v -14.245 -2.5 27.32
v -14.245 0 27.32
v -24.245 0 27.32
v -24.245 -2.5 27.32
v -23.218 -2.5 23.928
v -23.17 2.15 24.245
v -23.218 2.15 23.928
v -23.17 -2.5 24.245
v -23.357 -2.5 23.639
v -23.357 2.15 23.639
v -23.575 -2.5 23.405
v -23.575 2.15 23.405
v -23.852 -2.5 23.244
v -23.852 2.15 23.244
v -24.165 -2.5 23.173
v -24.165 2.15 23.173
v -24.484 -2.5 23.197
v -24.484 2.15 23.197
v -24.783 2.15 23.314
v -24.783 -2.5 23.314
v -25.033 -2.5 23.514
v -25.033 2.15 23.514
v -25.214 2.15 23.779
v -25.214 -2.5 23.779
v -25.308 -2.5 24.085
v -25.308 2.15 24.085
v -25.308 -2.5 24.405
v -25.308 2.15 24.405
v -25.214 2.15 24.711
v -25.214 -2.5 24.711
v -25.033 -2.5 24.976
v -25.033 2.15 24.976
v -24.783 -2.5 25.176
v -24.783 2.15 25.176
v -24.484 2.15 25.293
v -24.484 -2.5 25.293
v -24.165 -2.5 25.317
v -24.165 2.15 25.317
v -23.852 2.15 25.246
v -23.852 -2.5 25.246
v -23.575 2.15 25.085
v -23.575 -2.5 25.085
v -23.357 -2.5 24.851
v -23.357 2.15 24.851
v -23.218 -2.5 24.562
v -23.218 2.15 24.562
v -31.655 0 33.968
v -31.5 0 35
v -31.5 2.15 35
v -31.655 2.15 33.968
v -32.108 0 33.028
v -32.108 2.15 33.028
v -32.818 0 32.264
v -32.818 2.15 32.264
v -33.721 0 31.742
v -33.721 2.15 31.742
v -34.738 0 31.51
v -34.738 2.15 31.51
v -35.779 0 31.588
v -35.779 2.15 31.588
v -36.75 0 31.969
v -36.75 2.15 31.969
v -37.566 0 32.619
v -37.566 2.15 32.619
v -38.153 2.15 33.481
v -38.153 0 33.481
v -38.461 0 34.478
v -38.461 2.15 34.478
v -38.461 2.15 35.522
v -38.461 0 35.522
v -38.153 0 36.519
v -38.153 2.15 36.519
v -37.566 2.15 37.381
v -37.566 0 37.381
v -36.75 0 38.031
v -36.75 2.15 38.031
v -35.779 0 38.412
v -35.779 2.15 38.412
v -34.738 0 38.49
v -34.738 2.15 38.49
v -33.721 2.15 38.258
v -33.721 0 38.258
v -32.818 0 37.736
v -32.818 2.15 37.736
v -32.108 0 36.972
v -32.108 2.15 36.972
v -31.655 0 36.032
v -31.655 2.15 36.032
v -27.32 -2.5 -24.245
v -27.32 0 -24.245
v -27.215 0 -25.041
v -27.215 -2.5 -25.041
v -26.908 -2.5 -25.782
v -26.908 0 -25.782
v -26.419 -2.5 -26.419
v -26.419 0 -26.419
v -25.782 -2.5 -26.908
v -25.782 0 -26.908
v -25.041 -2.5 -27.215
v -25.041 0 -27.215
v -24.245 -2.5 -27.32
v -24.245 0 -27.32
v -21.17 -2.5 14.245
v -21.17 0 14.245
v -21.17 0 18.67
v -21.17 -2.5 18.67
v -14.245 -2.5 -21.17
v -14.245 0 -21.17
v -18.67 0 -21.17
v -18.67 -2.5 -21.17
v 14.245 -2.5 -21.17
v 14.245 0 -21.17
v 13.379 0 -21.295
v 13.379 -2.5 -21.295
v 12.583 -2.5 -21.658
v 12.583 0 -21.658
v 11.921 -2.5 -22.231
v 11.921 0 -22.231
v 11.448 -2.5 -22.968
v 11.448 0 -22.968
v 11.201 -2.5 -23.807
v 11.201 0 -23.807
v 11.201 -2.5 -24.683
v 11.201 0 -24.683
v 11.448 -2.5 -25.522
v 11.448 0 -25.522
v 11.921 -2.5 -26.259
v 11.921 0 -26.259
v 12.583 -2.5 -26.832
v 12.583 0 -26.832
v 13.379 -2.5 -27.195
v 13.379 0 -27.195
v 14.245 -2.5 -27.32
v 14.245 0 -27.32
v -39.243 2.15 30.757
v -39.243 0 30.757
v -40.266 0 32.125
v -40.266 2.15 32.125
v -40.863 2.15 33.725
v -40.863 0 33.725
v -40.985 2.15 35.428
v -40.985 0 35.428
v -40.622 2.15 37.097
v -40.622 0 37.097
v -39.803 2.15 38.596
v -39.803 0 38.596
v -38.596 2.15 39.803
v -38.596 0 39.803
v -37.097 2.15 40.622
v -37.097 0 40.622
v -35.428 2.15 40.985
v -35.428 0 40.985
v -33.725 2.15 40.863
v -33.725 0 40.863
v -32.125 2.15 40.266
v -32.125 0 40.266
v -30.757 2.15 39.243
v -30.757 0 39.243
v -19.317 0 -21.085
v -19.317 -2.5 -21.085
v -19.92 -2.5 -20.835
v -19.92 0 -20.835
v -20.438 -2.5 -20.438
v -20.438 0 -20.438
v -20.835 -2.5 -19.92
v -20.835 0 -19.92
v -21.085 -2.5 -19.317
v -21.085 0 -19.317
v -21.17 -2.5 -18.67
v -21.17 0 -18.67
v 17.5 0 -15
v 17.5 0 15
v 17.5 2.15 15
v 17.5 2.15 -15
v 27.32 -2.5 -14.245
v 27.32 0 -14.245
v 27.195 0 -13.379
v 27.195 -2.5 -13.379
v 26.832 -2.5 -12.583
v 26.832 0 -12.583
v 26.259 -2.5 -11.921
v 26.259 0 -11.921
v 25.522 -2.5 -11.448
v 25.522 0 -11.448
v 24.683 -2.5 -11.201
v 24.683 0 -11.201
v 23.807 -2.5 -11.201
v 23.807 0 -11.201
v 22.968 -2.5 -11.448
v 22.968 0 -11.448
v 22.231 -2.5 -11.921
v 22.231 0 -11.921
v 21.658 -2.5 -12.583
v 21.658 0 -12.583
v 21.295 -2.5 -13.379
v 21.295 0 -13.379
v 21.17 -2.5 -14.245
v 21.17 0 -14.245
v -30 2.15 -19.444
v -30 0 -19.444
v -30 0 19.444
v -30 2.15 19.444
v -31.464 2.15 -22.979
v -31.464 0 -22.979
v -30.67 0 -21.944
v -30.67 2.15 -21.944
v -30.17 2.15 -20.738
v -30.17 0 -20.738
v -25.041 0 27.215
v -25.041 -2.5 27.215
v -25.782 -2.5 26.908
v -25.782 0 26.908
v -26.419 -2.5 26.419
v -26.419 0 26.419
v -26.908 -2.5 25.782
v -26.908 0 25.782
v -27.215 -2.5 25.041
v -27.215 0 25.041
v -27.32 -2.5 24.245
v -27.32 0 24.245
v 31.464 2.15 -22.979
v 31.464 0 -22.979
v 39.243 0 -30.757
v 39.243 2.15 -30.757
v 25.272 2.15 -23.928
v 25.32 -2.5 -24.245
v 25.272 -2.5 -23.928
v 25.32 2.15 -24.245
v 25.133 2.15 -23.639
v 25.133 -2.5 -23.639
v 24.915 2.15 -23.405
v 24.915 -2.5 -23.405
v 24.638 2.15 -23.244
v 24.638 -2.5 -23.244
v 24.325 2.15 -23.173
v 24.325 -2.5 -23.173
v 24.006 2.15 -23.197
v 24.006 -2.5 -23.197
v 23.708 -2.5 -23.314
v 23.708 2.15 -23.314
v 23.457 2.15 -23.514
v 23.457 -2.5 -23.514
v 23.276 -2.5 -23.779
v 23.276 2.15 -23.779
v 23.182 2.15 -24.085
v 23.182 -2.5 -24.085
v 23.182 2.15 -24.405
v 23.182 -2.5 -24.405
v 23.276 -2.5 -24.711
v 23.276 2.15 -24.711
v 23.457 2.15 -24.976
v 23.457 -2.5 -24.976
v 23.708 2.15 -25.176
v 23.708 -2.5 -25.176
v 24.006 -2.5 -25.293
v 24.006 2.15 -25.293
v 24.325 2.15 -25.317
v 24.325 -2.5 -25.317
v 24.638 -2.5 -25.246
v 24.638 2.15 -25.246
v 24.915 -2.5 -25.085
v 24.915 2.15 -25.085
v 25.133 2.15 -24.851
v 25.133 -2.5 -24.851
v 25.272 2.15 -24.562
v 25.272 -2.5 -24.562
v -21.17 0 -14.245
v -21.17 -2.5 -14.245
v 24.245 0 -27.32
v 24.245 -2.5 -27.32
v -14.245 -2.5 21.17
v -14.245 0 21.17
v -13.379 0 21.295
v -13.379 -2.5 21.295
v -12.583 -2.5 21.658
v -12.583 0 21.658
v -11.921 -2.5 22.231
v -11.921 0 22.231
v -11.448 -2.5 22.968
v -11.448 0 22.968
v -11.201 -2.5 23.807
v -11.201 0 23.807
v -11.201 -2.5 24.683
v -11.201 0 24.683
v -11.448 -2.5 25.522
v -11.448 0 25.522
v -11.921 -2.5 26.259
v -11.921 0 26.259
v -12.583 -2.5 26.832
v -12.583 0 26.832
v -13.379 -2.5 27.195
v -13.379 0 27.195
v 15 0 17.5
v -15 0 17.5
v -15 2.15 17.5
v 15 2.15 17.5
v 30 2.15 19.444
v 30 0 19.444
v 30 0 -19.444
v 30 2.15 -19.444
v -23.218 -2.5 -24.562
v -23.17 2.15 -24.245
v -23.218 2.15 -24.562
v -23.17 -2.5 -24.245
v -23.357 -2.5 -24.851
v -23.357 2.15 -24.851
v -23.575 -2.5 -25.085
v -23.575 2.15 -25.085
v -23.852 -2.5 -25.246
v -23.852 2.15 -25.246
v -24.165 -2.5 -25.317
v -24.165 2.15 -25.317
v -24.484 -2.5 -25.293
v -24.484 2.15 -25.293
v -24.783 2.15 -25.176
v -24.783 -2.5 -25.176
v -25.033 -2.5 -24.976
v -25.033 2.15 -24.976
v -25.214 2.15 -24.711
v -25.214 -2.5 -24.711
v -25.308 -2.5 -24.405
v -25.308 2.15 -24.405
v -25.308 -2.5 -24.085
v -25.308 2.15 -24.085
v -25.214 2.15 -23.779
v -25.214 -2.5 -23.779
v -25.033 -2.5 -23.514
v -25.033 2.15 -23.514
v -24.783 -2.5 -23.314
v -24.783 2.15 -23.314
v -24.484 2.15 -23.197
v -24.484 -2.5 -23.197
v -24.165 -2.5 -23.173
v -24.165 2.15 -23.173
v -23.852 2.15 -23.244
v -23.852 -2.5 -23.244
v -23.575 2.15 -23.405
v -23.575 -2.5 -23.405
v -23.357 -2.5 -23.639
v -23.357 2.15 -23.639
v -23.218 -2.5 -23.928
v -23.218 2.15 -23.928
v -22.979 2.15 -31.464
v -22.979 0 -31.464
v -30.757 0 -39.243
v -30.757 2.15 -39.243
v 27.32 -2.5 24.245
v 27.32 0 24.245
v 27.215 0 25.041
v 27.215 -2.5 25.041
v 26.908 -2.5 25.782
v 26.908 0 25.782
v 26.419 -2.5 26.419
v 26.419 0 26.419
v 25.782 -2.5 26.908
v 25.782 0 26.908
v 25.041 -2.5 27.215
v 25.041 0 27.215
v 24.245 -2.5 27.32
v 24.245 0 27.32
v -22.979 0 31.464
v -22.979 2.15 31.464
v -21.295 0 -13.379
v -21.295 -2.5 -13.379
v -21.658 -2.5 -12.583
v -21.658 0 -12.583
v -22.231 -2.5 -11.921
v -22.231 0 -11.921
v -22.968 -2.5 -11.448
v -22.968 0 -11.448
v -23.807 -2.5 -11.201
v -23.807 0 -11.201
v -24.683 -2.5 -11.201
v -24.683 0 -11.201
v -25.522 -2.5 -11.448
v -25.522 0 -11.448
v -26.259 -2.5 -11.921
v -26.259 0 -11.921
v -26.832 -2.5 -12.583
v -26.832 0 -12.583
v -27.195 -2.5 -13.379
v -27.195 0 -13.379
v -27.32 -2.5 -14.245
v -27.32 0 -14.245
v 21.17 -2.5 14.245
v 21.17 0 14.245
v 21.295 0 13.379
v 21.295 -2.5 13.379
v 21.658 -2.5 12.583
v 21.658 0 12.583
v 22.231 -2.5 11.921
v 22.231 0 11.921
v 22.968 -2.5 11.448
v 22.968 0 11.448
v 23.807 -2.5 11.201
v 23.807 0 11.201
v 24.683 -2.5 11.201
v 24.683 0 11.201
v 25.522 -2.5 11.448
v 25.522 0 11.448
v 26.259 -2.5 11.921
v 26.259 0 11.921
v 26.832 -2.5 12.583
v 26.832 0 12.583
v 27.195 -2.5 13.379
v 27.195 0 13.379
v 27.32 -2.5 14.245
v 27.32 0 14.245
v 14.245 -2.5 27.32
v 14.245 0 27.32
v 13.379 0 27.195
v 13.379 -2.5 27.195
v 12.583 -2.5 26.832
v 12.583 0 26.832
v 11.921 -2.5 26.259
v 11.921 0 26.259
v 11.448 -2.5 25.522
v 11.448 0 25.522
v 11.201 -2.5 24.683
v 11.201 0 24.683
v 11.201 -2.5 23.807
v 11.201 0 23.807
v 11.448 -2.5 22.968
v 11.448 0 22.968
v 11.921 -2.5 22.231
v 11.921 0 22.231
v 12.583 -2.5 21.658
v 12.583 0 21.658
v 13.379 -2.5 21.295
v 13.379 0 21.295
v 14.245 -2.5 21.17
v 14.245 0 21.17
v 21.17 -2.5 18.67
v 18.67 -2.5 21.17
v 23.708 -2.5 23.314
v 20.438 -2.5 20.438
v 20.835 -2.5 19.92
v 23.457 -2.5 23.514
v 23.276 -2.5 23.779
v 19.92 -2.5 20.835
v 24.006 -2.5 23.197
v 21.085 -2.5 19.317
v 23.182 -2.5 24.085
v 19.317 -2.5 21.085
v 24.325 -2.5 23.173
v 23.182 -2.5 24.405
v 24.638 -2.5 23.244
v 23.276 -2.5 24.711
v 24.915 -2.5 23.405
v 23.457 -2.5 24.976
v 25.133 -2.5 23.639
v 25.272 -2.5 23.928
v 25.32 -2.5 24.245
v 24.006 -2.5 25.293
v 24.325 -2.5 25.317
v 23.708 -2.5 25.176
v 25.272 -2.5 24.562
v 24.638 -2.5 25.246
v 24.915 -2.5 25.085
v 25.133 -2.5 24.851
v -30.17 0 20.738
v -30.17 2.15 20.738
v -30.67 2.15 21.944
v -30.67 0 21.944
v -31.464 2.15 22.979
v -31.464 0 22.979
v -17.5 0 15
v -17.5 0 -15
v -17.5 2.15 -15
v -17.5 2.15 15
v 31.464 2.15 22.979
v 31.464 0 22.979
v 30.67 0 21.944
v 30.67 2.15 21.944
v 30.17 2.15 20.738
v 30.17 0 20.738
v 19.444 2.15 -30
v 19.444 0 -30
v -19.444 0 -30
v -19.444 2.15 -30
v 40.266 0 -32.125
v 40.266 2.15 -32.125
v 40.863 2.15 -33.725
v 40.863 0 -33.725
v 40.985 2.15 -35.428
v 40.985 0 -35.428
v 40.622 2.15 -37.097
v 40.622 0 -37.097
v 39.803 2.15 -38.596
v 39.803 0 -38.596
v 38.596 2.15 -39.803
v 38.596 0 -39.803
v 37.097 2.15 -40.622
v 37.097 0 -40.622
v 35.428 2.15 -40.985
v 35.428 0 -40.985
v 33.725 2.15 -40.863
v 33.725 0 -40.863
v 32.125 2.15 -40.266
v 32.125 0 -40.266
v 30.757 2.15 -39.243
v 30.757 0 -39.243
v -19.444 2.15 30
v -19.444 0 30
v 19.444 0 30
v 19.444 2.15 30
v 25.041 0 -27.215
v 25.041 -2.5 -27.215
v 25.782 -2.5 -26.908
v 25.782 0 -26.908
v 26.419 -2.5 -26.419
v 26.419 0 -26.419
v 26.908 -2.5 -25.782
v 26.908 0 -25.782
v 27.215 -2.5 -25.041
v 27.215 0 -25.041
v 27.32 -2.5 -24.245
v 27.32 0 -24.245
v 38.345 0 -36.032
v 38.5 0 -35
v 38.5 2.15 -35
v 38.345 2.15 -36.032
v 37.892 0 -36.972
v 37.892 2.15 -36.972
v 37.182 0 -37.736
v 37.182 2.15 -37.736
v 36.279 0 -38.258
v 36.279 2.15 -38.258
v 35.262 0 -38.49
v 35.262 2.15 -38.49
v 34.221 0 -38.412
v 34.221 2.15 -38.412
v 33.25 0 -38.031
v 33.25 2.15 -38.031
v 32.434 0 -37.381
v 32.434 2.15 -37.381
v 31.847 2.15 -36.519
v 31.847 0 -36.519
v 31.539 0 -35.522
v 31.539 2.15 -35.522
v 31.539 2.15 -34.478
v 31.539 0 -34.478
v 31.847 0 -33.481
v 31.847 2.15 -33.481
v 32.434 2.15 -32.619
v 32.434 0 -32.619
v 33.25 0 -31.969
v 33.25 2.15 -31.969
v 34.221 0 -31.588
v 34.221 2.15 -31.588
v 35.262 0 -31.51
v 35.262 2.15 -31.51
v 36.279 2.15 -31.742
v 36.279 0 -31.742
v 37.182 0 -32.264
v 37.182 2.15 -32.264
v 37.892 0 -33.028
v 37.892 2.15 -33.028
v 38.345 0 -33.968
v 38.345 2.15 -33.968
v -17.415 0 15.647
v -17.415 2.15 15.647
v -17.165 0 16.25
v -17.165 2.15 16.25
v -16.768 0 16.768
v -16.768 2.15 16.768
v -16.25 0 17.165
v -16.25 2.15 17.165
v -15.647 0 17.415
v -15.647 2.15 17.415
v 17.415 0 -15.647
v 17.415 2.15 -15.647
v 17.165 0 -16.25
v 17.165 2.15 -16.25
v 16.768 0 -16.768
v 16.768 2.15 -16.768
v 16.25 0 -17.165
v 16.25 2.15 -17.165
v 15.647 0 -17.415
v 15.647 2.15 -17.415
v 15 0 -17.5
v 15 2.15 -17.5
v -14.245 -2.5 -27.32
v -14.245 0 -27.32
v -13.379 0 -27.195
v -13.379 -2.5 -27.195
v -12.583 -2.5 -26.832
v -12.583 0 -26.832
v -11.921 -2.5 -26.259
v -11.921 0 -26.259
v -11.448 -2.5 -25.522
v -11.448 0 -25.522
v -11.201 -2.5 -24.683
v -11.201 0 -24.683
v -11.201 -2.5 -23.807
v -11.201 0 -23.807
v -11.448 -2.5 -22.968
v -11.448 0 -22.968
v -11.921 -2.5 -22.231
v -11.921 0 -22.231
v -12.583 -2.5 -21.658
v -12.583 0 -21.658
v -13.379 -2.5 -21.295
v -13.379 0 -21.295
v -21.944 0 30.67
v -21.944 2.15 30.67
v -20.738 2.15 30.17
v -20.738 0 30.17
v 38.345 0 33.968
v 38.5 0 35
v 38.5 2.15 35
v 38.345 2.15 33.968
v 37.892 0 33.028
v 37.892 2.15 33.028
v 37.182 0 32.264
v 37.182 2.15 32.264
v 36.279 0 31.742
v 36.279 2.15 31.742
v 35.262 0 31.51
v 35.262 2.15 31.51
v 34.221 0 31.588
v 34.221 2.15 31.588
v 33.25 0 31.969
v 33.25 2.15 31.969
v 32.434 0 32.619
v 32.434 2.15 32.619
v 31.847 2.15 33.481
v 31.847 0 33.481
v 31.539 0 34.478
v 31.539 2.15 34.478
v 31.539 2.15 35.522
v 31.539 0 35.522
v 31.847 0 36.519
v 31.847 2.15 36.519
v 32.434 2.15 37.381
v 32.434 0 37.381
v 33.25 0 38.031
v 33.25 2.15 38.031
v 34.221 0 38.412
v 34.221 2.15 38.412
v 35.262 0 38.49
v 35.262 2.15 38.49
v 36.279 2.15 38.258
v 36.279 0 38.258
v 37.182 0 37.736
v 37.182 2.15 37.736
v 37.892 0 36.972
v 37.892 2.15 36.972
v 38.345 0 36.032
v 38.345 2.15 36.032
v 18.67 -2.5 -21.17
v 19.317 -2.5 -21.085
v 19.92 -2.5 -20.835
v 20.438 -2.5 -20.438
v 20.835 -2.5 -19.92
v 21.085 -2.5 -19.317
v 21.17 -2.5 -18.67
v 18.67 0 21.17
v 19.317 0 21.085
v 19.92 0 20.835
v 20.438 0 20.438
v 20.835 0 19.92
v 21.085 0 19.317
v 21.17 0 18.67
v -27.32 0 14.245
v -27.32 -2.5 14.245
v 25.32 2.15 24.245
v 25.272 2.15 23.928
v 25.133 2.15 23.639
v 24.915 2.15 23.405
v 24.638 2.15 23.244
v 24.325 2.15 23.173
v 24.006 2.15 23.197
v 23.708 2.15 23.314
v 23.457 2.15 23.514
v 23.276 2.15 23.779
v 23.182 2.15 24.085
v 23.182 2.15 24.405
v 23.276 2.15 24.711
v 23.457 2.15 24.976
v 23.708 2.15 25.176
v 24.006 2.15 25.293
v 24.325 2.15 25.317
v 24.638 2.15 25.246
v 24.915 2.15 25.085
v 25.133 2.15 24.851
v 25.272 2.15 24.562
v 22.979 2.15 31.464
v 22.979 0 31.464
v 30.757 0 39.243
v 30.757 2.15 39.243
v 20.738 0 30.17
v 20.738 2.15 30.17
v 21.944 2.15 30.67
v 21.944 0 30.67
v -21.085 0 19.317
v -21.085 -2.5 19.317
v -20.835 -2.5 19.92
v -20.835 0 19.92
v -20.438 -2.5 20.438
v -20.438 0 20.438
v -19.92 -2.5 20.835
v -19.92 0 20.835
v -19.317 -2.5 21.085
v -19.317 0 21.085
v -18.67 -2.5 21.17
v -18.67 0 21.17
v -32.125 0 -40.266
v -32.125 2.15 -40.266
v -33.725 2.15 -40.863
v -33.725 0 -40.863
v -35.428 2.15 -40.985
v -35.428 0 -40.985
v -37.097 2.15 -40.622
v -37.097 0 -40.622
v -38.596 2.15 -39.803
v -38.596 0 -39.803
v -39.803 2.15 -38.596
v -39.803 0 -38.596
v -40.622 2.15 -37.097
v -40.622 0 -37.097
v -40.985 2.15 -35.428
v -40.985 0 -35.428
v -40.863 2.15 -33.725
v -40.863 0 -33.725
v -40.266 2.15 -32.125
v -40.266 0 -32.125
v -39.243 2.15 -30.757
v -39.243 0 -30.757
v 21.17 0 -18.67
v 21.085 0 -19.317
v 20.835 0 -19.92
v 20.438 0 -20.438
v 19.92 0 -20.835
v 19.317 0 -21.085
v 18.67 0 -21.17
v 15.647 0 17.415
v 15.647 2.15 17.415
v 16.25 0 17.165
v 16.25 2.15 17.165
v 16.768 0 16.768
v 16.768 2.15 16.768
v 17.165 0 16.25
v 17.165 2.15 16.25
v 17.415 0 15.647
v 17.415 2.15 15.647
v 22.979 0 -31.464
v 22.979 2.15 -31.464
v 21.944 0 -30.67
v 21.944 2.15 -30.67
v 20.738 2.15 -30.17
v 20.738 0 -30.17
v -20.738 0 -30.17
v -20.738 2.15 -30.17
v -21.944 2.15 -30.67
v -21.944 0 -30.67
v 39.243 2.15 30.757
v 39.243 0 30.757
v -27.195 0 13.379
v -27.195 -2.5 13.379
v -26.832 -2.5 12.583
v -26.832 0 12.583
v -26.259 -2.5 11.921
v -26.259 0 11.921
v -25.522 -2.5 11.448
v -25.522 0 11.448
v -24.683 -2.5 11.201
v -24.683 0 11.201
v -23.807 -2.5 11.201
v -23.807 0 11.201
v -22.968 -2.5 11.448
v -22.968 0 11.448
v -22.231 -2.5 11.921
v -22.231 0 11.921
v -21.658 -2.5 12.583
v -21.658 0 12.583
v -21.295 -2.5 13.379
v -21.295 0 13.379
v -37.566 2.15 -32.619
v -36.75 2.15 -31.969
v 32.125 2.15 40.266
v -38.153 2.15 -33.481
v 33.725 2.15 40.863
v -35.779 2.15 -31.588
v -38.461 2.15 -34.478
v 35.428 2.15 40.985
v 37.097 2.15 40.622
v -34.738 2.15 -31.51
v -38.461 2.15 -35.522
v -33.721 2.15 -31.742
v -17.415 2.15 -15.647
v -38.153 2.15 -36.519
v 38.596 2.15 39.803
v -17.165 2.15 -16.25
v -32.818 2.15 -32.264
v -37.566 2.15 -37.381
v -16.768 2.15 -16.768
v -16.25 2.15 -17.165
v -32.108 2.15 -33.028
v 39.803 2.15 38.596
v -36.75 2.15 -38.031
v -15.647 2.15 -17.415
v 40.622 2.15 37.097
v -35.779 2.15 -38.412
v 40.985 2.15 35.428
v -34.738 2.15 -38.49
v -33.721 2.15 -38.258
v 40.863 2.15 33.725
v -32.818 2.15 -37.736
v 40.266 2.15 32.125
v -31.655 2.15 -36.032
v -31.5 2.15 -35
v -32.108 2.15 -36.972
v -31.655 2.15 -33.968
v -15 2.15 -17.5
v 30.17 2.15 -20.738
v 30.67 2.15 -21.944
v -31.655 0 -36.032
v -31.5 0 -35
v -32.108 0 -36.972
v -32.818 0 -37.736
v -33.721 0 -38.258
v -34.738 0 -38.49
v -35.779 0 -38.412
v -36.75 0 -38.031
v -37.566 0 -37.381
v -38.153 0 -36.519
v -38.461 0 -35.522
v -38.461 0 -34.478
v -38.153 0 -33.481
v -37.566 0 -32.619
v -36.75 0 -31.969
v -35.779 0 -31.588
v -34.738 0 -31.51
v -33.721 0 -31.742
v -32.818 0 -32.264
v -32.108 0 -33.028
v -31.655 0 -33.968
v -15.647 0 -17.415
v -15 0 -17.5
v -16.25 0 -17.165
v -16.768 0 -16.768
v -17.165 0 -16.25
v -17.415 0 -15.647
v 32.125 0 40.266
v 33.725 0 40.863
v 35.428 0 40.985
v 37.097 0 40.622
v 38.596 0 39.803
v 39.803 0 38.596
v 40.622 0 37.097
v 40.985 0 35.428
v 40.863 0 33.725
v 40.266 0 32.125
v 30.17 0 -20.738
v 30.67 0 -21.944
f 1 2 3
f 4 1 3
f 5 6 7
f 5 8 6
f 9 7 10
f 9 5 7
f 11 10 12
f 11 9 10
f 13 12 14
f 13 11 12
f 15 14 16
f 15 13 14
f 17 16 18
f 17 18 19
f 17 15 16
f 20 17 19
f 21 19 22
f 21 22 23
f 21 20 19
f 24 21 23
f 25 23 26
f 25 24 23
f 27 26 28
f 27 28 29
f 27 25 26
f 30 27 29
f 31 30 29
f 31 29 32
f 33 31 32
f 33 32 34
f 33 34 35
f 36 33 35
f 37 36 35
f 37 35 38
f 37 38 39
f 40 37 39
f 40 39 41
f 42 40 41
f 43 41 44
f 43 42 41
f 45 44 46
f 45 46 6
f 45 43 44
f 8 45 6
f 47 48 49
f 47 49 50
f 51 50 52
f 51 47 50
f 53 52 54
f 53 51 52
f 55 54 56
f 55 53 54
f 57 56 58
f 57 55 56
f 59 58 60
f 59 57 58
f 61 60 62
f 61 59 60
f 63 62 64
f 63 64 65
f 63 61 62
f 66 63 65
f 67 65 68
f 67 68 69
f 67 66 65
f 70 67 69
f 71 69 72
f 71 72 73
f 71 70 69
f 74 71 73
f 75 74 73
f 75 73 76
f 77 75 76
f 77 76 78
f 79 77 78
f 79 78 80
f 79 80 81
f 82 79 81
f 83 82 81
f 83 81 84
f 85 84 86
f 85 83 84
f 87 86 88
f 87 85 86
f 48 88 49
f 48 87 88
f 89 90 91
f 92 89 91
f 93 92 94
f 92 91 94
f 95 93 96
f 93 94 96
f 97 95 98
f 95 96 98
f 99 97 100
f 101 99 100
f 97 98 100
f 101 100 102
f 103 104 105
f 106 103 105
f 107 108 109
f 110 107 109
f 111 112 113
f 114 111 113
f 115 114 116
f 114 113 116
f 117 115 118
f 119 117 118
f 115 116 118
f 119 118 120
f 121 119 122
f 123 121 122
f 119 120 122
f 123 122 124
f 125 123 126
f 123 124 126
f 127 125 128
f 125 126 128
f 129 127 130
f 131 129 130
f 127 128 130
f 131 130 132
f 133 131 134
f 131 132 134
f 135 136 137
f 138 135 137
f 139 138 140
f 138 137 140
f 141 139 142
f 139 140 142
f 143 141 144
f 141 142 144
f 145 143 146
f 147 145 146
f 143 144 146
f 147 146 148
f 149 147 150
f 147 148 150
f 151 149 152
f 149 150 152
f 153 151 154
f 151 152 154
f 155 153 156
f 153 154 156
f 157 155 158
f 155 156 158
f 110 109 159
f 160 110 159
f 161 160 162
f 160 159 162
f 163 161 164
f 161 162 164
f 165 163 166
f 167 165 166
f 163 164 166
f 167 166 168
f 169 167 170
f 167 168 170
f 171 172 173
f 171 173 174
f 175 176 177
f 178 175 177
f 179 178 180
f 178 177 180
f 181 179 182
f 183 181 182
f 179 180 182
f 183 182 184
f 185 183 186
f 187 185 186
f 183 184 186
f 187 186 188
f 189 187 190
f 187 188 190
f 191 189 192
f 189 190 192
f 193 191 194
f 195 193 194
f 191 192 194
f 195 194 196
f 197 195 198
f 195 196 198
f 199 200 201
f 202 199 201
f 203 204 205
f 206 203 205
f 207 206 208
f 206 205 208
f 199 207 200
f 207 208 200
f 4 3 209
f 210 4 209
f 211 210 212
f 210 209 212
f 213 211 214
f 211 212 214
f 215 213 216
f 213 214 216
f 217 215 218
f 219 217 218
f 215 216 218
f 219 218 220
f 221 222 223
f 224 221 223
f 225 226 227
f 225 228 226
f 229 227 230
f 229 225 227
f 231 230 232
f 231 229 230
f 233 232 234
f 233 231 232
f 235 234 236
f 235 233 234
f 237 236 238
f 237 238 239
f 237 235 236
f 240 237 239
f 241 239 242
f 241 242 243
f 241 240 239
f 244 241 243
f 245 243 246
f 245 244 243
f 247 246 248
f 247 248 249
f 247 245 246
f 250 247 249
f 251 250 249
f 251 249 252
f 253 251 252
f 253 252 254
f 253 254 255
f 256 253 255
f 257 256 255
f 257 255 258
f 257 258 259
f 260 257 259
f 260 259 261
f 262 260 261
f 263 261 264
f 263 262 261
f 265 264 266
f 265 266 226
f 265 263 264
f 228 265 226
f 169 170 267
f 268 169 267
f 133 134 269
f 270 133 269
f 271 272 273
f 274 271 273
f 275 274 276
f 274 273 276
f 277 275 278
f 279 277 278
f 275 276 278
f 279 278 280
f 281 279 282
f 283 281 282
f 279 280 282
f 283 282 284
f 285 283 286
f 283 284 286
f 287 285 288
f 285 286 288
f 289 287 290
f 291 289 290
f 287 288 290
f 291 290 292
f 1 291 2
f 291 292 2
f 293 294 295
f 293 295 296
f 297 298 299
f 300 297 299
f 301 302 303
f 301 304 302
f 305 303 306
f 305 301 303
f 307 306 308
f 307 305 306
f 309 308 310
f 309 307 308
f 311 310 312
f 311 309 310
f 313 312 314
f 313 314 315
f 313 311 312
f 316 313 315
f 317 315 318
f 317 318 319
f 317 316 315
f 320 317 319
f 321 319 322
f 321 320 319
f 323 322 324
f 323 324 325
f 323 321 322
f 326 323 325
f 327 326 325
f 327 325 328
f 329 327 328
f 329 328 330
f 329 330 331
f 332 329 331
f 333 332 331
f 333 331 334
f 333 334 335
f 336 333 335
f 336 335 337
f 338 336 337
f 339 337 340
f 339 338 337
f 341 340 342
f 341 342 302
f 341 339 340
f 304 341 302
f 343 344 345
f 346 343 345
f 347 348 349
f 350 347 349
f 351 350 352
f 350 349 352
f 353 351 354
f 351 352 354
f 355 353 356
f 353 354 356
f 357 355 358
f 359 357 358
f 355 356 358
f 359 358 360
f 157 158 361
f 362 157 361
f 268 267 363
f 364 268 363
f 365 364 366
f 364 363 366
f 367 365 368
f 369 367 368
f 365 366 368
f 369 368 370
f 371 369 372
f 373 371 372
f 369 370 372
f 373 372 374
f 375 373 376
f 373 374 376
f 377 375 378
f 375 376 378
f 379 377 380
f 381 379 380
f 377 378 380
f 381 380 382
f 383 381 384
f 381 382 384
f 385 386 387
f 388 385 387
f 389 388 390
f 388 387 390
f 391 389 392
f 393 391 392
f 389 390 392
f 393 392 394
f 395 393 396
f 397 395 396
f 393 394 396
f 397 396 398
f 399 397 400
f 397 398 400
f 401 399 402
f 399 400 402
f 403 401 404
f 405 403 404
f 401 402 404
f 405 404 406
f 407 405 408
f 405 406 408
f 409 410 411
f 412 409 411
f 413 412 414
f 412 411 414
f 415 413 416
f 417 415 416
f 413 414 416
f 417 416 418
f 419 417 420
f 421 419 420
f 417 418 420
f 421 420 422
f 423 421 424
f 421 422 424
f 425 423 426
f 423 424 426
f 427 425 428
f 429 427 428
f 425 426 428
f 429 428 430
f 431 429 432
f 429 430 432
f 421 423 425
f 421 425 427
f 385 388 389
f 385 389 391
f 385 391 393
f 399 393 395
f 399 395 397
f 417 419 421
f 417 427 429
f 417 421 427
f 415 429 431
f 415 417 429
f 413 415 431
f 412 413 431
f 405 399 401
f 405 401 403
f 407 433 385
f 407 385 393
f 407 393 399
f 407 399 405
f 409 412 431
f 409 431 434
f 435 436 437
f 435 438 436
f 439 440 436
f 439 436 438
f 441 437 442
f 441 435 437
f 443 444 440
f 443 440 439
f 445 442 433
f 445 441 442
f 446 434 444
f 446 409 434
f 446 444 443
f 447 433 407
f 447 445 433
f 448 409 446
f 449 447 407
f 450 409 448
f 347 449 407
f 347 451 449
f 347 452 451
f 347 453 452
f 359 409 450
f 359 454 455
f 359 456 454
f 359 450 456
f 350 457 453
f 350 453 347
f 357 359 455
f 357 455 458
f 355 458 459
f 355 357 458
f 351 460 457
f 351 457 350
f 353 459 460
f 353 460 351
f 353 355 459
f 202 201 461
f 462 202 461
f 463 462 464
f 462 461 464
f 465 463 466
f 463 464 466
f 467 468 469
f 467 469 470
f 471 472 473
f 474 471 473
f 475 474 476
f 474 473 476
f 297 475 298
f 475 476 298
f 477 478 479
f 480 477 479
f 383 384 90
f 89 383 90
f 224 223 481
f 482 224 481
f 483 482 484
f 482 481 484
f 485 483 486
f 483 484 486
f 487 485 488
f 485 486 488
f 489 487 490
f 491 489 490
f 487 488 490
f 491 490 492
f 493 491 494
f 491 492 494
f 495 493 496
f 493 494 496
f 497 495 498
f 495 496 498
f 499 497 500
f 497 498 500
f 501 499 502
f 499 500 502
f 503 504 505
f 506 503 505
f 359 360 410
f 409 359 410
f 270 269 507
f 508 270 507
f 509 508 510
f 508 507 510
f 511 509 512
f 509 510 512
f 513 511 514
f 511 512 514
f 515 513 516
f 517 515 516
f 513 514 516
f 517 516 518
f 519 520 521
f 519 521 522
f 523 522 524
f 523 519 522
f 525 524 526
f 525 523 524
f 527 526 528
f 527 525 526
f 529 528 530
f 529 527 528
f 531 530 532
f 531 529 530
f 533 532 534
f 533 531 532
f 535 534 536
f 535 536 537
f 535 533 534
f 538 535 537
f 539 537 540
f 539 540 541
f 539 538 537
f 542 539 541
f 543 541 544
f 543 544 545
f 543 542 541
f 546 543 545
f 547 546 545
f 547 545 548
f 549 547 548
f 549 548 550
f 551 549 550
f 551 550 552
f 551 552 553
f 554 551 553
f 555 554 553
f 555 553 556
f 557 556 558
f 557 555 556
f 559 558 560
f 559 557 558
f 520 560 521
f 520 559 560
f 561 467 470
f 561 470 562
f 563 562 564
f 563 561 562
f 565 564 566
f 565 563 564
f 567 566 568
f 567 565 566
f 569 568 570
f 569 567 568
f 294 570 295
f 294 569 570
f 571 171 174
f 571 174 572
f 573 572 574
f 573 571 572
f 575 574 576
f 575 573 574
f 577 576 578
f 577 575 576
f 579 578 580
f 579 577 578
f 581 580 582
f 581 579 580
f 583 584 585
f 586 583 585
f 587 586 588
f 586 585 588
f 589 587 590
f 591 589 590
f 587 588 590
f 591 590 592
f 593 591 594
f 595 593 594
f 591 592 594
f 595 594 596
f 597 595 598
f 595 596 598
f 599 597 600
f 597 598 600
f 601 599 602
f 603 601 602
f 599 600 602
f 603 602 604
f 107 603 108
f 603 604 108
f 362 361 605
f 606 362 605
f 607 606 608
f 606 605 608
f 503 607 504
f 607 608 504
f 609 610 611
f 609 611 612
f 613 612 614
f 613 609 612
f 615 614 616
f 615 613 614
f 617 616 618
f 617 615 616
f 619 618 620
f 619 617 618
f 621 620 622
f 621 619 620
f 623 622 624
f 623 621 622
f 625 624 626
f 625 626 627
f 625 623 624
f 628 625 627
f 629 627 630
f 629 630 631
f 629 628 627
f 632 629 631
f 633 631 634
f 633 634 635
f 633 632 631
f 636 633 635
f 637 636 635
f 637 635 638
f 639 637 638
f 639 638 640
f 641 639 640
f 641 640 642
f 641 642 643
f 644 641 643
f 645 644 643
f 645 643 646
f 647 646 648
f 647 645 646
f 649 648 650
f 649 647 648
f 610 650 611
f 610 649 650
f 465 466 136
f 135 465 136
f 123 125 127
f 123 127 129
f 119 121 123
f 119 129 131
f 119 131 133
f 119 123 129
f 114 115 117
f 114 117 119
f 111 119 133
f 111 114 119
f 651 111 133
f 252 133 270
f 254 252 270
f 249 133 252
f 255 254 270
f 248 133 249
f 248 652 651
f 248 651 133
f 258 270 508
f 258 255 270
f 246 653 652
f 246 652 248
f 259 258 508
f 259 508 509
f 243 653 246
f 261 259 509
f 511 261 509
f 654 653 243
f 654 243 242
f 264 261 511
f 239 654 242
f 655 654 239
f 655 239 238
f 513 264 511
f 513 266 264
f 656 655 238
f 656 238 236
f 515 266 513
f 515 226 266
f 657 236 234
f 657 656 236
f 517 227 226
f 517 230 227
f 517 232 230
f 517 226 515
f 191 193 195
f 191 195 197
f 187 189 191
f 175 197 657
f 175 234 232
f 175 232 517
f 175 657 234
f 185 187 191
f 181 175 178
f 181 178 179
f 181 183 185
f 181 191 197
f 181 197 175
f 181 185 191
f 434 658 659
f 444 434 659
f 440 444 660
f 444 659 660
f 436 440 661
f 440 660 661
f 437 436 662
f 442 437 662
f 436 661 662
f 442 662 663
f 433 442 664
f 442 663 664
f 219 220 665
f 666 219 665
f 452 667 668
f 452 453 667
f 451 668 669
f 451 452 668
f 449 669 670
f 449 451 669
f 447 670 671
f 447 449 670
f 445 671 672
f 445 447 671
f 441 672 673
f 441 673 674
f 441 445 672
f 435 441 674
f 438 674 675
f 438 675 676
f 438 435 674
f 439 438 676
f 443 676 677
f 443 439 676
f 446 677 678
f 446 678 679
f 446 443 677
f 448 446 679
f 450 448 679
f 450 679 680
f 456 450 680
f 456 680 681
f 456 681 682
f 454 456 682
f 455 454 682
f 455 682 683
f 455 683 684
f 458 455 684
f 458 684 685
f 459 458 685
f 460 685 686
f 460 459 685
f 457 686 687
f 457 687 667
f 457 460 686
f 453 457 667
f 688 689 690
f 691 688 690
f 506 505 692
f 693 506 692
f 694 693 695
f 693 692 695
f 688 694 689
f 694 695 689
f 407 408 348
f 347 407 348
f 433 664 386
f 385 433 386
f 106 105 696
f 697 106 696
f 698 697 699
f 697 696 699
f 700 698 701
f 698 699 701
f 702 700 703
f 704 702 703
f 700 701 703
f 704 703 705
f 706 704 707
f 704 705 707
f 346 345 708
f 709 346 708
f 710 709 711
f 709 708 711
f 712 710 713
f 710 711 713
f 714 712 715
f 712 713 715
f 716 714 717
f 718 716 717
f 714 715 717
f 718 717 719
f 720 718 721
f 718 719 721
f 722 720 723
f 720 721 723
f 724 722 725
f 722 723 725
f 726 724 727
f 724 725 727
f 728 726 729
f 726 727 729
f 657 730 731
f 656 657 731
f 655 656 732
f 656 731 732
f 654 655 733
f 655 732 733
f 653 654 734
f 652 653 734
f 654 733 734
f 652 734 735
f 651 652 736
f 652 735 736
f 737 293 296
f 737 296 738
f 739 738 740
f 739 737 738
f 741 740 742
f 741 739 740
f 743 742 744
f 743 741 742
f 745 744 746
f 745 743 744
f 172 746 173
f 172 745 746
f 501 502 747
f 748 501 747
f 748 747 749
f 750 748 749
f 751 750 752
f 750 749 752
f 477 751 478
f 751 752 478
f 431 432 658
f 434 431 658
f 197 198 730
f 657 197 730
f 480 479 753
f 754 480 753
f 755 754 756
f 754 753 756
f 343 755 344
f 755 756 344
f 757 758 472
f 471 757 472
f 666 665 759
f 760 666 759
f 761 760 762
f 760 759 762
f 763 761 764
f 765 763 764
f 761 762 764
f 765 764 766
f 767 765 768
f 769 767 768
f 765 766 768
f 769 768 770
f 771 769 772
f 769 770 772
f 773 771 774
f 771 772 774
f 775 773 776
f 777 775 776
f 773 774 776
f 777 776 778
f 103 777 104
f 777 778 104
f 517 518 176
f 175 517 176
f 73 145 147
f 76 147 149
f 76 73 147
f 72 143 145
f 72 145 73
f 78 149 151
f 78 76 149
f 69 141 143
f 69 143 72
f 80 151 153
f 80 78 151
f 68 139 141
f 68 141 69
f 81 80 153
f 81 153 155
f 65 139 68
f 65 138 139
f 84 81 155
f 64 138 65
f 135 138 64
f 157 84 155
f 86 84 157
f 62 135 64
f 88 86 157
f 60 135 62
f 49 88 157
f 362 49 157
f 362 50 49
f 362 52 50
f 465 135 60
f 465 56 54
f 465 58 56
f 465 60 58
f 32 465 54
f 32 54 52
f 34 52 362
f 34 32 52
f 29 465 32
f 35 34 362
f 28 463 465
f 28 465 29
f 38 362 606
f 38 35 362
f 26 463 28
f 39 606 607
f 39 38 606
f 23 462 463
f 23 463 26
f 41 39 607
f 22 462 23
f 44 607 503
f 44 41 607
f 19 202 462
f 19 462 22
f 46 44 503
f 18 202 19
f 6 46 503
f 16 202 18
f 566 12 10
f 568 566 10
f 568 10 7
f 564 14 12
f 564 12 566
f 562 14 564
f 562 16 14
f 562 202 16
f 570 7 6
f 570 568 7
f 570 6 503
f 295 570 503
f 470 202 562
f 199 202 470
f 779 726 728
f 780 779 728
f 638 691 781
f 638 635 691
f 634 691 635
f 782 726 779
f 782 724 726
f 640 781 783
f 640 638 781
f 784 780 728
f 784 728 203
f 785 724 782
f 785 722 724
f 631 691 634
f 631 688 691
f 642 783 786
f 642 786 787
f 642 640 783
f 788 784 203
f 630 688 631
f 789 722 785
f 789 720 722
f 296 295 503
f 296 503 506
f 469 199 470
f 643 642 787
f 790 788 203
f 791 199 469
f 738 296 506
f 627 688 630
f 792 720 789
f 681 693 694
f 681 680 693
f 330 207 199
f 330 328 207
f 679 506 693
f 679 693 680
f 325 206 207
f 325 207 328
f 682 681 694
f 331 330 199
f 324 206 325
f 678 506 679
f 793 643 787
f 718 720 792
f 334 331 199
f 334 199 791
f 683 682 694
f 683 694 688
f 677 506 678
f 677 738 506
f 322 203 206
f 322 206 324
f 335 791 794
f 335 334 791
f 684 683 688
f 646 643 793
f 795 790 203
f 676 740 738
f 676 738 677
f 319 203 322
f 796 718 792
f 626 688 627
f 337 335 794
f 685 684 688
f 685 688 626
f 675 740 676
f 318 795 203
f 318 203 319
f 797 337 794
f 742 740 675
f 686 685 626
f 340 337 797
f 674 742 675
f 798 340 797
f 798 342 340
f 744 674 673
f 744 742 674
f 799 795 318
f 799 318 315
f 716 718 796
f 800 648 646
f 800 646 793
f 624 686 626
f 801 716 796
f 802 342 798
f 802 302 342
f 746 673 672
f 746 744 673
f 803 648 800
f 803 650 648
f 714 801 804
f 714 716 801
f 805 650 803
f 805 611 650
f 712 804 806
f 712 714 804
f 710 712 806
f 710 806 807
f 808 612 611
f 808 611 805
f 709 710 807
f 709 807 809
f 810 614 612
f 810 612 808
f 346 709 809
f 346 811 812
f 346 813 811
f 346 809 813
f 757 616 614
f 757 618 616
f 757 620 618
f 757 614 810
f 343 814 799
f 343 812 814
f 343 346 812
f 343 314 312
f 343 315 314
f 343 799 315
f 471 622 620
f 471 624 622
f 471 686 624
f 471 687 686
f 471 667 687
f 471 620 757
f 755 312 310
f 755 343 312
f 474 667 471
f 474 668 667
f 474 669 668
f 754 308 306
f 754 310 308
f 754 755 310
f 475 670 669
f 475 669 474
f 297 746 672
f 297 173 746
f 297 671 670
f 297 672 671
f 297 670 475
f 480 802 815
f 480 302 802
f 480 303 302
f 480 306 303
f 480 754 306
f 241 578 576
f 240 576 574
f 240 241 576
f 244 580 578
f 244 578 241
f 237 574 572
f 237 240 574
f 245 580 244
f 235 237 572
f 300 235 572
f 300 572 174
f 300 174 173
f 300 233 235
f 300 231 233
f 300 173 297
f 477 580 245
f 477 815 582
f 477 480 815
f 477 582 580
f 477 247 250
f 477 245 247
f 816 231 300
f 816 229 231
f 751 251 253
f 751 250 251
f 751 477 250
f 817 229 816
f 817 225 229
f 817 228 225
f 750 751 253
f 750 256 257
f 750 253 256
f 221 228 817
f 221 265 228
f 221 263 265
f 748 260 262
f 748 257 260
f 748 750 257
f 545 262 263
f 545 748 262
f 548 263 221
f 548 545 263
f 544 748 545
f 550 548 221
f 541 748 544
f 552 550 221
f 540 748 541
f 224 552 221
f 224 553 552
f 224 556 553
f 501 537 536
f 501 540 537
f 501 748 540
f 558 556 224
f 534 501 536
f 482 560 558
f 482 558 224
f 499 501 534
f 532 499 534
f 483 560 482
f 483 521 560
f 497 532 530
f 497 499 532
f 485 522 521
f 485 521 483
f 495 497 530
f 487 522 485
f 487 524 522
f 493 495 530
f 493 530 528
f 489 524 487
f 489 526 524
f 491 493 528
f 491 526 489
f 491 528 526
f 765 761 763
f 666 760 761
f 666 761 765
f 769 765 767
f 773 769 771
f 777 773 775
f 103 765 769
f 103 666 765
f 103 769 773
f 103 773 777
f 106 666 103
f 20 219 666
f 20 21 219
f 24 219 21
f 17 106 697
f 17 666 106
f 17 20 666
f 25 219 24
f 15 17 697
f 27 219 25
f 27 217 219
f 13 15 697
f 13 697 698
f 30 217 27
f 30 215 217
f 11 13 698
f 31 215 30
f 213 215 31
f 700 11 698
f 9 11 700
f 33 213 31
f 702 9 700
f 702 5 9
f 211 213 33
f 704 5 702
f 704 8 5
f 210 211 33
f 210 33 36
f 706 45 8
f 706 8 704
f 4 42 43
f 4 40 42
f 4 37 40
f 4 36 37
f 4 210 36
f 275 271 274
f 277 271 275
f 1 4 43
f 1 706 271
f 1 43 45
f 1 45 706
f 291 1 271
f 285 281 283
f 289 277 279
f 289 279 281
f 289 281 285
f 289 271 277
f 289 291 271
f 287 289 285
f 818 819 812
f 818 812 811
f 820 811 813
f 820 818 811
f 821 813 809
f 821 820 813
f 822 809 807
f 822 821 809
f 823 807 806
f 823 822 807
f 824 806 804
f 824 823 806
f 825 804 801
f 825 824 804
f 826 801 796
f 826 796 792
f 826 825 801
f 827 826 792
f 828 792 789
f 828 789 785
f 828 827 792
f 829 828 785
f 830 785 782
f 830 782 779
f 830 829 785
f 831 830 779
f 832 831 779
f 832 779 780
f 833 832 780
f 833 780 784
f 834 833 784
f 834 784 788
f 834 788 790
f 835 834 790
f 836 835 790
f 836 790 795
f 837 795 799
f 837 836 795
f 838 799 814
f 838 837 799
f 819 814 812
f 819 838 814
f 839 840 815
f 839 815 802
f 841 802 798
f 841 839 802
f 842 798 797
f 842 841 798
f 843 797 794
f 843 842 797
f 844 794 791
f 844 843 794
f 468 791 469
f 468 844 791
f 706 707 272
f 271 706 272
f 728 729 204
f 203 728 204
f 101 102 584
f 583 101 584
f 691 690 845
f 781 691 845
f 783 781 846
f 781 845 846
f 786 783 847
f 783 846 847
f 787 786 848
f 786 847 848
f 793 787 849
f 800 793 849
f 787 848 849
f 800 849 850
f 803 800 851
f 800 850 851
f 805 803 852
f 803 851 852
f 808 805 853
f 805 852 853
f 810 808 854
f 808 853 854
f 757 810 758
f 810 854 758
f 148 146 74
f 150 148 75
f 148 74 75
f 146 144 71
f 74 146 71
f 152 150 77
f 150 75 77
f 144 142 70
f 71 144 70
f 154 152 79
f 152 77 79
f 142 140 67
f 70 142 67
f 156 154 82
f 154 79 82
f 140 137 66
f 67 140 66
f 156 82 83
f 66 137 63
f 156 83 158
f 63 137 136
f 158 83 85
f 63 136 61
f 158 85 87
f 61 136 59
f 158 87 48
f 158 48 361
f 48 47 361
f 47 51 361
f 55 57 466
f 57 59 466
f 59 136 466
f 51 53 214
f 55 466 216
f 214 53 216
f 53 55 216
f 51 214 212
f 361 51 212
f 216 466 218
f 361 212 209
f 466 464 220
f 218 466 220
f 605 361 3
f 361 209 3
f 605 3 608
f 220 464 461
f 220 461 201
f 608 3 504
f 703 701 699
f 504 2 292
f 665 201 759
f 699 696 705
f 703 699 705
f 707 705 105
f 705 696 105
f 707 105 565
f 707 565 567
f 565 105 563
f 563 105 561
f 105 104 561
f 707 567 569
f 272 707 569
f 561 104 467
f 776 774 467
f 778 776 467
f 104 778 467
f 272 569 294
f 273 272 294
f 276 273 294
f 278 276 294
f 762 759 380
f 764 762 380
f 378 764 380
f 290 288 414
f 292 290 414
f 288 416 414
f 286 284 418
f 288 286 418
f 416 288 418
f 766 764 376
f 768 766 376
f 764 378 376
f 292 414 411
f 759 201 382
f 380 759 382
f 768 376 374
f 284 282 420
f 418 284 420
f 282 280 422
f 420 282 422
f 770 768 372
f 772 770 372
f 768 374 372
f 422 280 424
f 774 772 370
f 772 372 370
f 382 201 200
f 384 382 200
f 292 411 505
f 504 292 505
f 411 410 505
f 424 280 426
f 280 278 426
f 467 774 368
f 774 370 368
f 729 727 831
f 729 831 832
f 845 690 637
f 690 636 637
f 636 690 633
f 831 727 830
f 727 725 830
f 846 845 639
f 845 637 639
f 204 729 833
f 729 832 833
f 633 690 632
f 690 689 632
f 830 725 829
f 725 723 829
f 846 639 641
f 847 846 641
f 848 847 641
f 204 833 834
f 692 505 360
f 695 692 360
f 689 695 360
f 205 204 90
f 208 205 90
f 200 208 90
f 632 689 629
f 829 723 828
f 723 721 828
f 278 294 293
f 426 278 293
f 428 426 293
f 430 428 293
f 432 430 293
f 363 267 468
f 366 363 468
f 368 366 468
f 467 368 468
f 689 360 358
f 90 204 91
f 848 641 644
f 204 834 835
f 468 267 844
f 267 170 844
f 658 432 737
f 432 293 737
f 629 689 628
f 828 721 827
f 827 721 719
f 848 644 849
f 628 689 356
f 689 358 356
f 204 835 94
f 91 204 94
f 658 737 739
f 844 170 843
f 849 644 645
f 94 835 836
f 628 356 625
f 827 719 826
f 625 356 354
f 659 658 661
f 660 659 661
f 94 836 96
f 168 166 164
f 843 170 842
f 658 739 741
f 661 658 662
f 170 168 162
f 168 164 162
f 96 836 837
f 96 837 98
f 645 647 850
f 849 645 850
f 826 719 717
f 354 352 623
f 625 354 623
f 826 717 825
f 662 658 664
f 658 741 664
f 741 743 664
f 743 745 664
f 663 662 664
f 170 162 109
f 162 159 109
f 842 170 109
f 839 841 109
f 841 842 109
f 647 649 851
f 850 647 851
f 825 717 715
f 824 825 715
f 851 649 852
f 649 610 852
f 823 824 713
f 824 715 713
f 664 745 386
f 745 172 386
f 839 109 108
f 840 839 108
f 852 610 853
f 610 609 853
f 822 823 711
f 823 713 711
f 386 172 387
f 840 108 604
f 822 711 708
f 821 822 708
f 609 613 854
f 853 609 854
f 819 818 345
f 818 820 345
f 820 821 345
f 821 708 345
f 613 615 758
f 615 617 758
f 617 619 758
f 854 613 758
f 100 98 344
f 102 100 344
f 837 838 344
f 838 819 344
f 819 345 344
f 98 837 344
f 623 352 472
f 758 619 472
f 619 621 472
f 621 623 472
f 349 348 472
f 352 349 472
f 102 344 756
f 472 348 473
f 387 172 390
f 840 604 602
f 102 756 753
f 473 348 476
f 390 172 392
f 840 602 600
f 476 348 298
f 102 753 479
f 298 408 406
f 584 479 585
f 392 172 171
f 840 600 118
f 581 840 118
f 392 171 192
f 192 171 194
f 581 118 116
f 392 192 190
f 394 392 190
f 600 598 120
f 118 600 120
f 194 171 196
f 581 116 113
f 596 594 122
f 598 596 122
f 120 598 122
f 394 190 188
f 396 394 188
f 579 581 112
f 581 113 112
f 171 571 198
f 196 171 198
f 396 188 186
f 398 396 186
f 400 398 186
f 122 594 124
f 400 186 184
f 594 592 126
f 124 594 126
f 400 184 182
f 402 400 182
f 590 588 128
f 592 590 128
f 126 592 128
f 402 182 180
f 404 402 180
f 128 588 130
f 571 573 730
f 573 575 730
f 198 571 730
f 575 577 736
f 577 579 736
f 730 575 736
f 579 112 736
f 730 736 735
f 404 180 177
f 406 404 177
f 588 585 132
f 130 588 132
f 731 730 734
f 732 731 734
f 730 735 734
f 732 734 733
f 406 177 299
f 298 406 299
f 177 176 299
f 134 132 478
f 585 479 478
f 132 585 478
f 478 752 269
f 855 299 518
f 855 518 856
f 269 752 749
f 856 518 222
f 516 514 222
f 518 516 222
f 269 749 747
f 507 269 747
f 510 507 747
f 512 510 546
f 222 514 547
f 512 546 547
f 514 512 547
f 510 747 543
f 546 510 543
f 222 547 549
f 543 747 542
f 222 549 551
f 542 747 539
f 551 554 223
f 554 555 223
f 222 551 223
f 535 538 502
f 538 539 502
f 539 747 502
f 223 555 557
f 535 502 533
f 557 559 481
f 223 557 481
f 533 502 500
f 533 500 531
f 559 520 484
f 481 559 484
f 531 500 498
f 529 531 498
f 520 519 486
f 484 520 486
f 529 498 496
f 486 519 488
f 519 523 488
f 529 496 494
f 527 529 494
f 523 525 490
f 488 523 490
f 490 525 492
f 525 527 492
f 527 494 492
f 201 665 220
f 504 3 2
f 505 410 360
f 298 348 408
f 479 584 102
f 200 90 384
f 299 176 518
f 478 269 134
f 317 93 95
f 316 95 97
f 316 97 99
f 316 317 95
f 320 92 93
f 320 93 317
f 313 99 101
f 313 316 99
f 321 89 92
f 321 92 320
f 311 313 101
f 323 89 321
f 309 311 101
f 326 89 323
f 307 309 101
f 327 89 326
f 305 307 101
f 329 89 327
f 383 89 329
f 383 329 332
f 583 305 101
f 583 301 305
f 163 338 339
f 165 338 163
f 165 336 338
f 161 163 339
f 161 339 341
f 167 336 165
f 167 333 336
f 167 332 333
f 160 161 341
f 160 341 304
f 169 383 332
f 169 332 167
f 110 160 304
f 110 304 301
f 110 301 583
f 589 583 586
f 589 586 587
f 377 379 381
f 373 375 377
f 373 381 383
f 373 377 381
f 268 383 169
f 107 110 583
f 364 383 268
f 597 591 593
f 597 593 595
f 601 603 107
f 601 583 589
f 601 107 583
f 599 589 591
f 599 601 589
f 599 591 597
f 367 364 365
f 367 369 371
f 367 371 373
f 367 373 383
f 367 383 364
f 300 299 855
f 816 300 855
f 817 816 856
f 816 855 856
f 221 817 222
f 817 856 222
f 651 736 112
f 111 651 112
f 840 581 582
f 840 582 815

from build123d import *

# Parameters (mm, degrees)
SKETCH1_R           = 1.075
SKETCH1_R_2         = 3.5
BOSS_EXTRUDE1_DEPTH = 2.15
SKETCH2_R           = 1.075
BOSS_EXTRUDE2_DEPTH = 2.5


with BuildPart() as part:
    # Sketch1 → Boss-Extrude1 (new body)
    with BuildSketch(Plane(origin=(0, 0, 0), x_dir=(1, 0, 0), z_dir=(0, 1, 0))):
        with BuildLine():
            Line((-30, 19.443650814), (-30, -19.443650814))
            ThreePointArc((-30, -19.443650814), (-30.380602337, -21.357067976), (-31.464466094, -22.97918472))
            Line((-31.464466094, -22.97918472), (-39.242640687, -30.757359313))
            ThreePointArc((-39.242640687, -30.757359313), (-39.242640687, -39.242640687), (-30.757359313, -39.242640687))
            Line((-30.757359313, -39.242640687), (-22.97918472, -31.464466094))
            ThreePointArc((-22.97918472, -31.464466094), (-21.357067976, -30.380602337), (-19.443650814, -30))
            Line((-19.443650814, -30), (19.443650814, -30))
            ThreePointArc((19.443650814, -30), (21.357067976, -30.380602337), (22.97918472, -31.464466094))
            Line((22.97918472, -31.464466094), (30.757359313, -39.242640687))
            ThreePointArc((30.757359313, -39.242640687), (39.242640687, -39.242640687), (39.242640687, -30.757359313))
            Line((39.242640687, -30.757359313), (31.464466094, -22.97918472))
            ThreePointArc((31.464466094, -22.97918472), (30.380602337, -21.357067976), (30, -19.443650814))
            Line((30, -19.443650814), (30, 19.443650814))
            ThreePointArc((30, 19.443650814), (30.380602337, 21.357067976), (31.464466094, 22.97918472))
            Line((31.464466094, 22.97918472), (39.242640687, 30.757359313))
            ThreePointArc((39.242640687, 30.757359313), (39.242640687, 39.242640687), (30.757359313, 39.242640687))
            Line((30.757359313, 39.242640687), (22.97918472, 31.464466094))
            ThreePointArc((22.97918472, 31.464466094), (21.357067976, 30.380602337), (19.443650814, 30))
            Line((19.443650814, 30), (-19.443650814, 30))
            ThreePointArc((-19.443650814, 30), (-21.357067976, 30.380602337), (-22.97918472, 31.464466094))
            Line((-22.97918472, 31.464466094), (-30.757359313, 39.242640687))
            ThreePointArc((-30.757359313, 39.242640687), (-39.242640687, 39.242640687), (-39.242640687, 30.757359313))
            Line((-39.242640687, 30.757359313), (-31.464466094, 22.97918472))
            ThreePointArc((-31.464466094, 22.97918472), (-30.380602337, 21.357067976), (-30, 19.443650814))
        make_face()
        with Locations((-24.245, 24.245)):
            Circle(SKETCH1_R, mode=Mode.SUBTRACT)
        with Locations((24.245, 24.245)):
            Circle(SKETCH1_R, mode=Mode.SUBTRACT)
        with Locations((24.245, -24.245)):
            Circle(SKETCH1_R, mode=Mode.SUBTRACT)
        with Locations((-24.245, -24.245)):
            Circle(SKETCH1_R, mode=Mode.SUBTRACT)
        with Locations((35, -35)):
            Circle(SKETCH1_R_2, mode=Mode.SUBTRACT)
        with Locations((-35, -35)):
            Circle(SKETCH1_R_2, mode=Mode.SUBTRACT)
        with Locations((-35, 35)):
            Circle(SKETCH1_R_2, mode=Mode.SUBTRACT)
        with Locations((35, 35)):
            Circle(SKETCH1_R_2, mode=Mode.SUBTRACT)
        with BuildLine():
            Line((-15, -17.5), (15, -17.5))
            ThreePointArc((15, -17.5), (16.767766953, -16.767766953), (17.5, -15))
            Line((17.5, -15), (17.5, 15))
            ThreePointArc((17.5, 15), (16.767766953, 16.767766953), (15, 17.5))
            Line((15, 17.5), (-15, 17.5))
            ThreePointArc((-15, 17.5), (-16.767766953, 16.767766953), (-17.5, 15))
            Line((-17.5, 15), (-17.5, -15))
            ThreePointArc((-17.5, -15), (-16.767766953, -16.767766953), (-15, -17.5))
        make_face(mode=Mode.SUBTRACT)
    extrude(amount=BOSS_EXTRUDE1_DEPTH)

    # Sketch2 → Boss-Extrude2 (add)
    with BuildSketch(Plane.XZ):
        with BuildLine():
            Line((27.32, -24.245), (27.32, -14.245))
            ThreePointArc((27.32, -14.245), (24.245, -11.17), (21.17, -14.245))
            Line((21.17, -14.245), (21.17, -18.67))
            ThreePointArc((21.17, -18.67), (20.437766953, -20.437766953), (18.67, -21.17))
            Line((18.67, -21.17), (14.245, -21.17))
            ThreePointArc((14.245, -21.17), (11.17, -24.245), (14.245, -27.32))
            Line((14.245, -27.32), (24.245, -27.32))
            ThreePointArc((24.245, -27.32), (26.419353352, -26.419353352), (27.32, -24.245))
        make_face()
        with Locations((24.245, -24.245)):
            Circle(SKETCH2_R, mode=Mode.SUBTRACT)
        with BuildLine():
            Line((-24.245, -27.32), (-14.245, -27.32))
            ThreePointArc((-14.245, -27.32), (-11.17, -24.245), (-14.245, -21.17))
            Line((-14.245, -21.17), (-18.67, -21.17))
            ThreePointArc((-18.67, -21.17), (-20.437766953, -20.437766953), (-21.17, -18.67))
            Line((-21.17, -18.67), (-21.17, -14.245))
            ThreePointArc((-21.17, -14.245), (-24.245, -11.17), (-27.32, -14.245))
            Line((-27.32, -14.245), (-27.32, -24.245))
            ThreePointArc((-27.32, -24.245), (-26.419353352, -26.419353352), (-24.245, -27.32))
        make_face()
        with Locations((-24.245, -24.245)):
            Circle(SKETCH2_R, mode=Mode.SUBTRACT)
        with BuildLine():
            Line((-27.32, 24.245), (-27.32, 14.245))
            ThreePointArc((-27.32, 14.245), (-24.245, 11.17), (-21.17, 14.245))
            Line((-21.17, 14.245), (-21.17, 18.67))
            ThreePointArc((-21.17, 18.67), (-20.437766953, 20.437766953), (-18.67, 21.17))
            Line((-18.67, 21.17), (-14.245, 21.17))
            ThreePointArc((-14.245, 21.17), (-11.17, 24.245), (-14.245, 27.32))
            Line((-14.245, 27.32), (-24.245, 27.32))
            ThreePointArc((-24.245, 27.32), (-26.419353352, 26.419353352), (-27.32, 24.245))
        make_face()
        with Locations((-24.245, 24.245)):
            Circle(SKETCH2_R, mode=Mode.SUBTRACT)
        with BuildLine():
            Line((24.245, 27.32), (14.245, 27.32))
            ThreePointArc((14.245, 27.32), (11.17, 24.245), (14.245, 21.17))
            Line((14.245, 21.17), (18.67, 21.17))
            ThreePointArc((18.67, 21.17), (20.437766953, 20.437766953), (21.17, 18.67))
            Line((21.17, 18.67), (21.17, 14.245))
            ThreePointArc((21.17, 14.245), (24.245, 11.17), (27.32, 14.245))
            Line((27.32, 14.245), (27.32, 24.245))
            ThreePointArc((27.32, 24.245), (26.419353352, 26.419353352), (24.245, 27.32))
        make_face()
        with Locations((24.245, 24.245)):
            Circle(SKETCH2_R, mode=Mode.SUBTRACT)
    extrude(amount=BOSS_EXTRUDE2_DEPTH)


solid = part.part
